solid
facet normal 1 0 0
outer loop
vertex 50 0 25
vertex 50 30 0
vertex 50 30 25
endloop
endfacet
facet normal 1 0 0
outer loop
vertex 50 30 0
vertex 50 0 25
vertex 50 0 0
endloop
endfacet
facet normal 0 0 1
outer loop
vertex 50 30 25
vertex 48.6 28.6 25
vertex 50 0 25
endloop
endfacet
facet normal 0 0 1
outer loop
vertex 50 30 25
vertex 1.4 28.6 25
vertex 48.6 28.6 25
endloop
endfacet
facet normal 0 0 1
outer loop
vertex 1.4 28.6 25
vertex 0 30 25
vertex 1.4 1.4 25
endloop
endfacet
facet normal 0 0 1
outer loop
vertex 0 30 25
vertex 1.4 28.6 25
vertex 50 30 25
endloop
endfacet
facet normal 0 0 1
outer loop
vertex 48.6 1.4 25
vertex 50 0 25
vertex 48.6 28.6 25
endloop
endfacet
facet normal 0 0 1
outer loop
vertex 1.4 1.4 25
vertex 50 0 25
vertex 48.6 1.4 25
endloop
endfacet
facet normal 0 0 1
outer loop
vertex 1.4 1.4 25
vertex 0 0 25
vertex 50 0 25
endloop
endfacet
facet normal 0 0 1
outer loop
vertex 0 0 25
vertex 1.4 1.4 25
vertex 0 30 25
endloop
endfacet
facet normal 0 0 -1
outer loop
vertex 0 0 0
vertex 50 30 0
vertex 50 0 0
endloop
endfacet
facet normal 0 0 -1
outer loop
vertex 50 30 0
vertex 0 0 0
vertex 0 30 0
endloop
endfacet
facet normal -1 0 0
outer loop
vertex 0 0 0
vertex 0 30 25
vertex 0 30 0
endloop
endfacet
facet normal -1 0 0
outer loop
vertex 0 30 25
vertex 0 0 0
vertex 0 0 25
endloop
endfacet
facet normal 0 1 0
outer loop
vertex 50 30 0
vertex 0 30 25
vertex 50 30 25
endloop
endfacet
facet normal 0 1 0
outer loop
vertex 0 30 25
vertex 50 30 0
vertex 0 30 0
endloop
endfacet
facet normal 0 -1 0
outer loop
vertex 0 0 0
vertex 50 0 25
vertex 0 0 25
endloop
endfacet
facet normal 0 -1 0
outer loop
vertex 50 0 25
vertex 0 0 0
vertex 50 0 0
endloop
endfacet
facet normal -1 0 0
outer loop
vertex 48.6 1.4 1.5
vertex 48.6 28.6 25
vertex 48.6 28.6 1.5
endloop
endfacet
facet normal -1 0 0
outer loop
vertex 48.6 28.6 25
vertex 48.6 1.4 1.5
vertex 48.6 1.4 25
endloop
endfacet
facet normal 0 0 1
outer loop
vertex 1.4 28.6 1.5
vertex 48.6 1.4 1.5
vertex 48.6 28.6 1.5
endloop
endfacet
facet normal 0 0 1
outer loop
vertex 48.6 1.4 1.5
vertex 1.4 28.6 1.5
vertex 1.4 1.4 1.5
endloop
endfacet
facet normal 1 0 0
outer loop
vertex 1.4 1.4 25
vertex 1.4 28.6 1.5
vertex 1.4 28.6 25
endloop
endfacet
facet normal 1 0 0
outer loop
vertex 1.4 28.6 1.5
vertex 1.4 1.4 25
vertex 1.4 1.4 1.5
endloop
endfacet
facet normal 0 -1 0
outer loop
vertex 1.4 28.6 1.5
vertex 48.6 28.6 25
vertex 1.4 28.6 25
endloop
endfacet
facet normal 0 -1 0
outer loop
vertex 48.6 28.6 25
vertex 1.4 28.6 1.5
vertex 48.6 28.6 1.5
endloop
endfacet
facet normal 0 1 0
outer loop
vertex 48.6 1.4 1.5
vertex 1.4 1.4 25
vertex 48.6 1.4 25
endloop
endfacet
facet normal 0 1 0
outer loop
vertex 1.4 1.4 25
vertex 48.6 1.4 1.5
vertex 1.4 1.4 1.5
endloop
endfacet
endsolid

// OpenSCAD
$fn = 32;

// ----------------------------------------------------------------------
// Open box: 1.4 mm walls
// ----------------------------------------------------------------------

// --- parameters (mm) ---
box_l = 50;               // outer length, X
box_w = 30;               // outer width, Y
box_h = 25;               // outer height, Z
wall = 1.4;               // wall thickness
floor = 1.5;              // floor thickness
fit_tol = 0.1;            // tolerance for press fits, mm
free_tol = 0.3;           // tolerance for clearance fits, mm

difference() {
  cube([box_l, box_w, box_h]);
  translate([wall, wall, floor])
    cube([box_l - 2 * wall, box_w - 2 * wall, box_h]);
}
